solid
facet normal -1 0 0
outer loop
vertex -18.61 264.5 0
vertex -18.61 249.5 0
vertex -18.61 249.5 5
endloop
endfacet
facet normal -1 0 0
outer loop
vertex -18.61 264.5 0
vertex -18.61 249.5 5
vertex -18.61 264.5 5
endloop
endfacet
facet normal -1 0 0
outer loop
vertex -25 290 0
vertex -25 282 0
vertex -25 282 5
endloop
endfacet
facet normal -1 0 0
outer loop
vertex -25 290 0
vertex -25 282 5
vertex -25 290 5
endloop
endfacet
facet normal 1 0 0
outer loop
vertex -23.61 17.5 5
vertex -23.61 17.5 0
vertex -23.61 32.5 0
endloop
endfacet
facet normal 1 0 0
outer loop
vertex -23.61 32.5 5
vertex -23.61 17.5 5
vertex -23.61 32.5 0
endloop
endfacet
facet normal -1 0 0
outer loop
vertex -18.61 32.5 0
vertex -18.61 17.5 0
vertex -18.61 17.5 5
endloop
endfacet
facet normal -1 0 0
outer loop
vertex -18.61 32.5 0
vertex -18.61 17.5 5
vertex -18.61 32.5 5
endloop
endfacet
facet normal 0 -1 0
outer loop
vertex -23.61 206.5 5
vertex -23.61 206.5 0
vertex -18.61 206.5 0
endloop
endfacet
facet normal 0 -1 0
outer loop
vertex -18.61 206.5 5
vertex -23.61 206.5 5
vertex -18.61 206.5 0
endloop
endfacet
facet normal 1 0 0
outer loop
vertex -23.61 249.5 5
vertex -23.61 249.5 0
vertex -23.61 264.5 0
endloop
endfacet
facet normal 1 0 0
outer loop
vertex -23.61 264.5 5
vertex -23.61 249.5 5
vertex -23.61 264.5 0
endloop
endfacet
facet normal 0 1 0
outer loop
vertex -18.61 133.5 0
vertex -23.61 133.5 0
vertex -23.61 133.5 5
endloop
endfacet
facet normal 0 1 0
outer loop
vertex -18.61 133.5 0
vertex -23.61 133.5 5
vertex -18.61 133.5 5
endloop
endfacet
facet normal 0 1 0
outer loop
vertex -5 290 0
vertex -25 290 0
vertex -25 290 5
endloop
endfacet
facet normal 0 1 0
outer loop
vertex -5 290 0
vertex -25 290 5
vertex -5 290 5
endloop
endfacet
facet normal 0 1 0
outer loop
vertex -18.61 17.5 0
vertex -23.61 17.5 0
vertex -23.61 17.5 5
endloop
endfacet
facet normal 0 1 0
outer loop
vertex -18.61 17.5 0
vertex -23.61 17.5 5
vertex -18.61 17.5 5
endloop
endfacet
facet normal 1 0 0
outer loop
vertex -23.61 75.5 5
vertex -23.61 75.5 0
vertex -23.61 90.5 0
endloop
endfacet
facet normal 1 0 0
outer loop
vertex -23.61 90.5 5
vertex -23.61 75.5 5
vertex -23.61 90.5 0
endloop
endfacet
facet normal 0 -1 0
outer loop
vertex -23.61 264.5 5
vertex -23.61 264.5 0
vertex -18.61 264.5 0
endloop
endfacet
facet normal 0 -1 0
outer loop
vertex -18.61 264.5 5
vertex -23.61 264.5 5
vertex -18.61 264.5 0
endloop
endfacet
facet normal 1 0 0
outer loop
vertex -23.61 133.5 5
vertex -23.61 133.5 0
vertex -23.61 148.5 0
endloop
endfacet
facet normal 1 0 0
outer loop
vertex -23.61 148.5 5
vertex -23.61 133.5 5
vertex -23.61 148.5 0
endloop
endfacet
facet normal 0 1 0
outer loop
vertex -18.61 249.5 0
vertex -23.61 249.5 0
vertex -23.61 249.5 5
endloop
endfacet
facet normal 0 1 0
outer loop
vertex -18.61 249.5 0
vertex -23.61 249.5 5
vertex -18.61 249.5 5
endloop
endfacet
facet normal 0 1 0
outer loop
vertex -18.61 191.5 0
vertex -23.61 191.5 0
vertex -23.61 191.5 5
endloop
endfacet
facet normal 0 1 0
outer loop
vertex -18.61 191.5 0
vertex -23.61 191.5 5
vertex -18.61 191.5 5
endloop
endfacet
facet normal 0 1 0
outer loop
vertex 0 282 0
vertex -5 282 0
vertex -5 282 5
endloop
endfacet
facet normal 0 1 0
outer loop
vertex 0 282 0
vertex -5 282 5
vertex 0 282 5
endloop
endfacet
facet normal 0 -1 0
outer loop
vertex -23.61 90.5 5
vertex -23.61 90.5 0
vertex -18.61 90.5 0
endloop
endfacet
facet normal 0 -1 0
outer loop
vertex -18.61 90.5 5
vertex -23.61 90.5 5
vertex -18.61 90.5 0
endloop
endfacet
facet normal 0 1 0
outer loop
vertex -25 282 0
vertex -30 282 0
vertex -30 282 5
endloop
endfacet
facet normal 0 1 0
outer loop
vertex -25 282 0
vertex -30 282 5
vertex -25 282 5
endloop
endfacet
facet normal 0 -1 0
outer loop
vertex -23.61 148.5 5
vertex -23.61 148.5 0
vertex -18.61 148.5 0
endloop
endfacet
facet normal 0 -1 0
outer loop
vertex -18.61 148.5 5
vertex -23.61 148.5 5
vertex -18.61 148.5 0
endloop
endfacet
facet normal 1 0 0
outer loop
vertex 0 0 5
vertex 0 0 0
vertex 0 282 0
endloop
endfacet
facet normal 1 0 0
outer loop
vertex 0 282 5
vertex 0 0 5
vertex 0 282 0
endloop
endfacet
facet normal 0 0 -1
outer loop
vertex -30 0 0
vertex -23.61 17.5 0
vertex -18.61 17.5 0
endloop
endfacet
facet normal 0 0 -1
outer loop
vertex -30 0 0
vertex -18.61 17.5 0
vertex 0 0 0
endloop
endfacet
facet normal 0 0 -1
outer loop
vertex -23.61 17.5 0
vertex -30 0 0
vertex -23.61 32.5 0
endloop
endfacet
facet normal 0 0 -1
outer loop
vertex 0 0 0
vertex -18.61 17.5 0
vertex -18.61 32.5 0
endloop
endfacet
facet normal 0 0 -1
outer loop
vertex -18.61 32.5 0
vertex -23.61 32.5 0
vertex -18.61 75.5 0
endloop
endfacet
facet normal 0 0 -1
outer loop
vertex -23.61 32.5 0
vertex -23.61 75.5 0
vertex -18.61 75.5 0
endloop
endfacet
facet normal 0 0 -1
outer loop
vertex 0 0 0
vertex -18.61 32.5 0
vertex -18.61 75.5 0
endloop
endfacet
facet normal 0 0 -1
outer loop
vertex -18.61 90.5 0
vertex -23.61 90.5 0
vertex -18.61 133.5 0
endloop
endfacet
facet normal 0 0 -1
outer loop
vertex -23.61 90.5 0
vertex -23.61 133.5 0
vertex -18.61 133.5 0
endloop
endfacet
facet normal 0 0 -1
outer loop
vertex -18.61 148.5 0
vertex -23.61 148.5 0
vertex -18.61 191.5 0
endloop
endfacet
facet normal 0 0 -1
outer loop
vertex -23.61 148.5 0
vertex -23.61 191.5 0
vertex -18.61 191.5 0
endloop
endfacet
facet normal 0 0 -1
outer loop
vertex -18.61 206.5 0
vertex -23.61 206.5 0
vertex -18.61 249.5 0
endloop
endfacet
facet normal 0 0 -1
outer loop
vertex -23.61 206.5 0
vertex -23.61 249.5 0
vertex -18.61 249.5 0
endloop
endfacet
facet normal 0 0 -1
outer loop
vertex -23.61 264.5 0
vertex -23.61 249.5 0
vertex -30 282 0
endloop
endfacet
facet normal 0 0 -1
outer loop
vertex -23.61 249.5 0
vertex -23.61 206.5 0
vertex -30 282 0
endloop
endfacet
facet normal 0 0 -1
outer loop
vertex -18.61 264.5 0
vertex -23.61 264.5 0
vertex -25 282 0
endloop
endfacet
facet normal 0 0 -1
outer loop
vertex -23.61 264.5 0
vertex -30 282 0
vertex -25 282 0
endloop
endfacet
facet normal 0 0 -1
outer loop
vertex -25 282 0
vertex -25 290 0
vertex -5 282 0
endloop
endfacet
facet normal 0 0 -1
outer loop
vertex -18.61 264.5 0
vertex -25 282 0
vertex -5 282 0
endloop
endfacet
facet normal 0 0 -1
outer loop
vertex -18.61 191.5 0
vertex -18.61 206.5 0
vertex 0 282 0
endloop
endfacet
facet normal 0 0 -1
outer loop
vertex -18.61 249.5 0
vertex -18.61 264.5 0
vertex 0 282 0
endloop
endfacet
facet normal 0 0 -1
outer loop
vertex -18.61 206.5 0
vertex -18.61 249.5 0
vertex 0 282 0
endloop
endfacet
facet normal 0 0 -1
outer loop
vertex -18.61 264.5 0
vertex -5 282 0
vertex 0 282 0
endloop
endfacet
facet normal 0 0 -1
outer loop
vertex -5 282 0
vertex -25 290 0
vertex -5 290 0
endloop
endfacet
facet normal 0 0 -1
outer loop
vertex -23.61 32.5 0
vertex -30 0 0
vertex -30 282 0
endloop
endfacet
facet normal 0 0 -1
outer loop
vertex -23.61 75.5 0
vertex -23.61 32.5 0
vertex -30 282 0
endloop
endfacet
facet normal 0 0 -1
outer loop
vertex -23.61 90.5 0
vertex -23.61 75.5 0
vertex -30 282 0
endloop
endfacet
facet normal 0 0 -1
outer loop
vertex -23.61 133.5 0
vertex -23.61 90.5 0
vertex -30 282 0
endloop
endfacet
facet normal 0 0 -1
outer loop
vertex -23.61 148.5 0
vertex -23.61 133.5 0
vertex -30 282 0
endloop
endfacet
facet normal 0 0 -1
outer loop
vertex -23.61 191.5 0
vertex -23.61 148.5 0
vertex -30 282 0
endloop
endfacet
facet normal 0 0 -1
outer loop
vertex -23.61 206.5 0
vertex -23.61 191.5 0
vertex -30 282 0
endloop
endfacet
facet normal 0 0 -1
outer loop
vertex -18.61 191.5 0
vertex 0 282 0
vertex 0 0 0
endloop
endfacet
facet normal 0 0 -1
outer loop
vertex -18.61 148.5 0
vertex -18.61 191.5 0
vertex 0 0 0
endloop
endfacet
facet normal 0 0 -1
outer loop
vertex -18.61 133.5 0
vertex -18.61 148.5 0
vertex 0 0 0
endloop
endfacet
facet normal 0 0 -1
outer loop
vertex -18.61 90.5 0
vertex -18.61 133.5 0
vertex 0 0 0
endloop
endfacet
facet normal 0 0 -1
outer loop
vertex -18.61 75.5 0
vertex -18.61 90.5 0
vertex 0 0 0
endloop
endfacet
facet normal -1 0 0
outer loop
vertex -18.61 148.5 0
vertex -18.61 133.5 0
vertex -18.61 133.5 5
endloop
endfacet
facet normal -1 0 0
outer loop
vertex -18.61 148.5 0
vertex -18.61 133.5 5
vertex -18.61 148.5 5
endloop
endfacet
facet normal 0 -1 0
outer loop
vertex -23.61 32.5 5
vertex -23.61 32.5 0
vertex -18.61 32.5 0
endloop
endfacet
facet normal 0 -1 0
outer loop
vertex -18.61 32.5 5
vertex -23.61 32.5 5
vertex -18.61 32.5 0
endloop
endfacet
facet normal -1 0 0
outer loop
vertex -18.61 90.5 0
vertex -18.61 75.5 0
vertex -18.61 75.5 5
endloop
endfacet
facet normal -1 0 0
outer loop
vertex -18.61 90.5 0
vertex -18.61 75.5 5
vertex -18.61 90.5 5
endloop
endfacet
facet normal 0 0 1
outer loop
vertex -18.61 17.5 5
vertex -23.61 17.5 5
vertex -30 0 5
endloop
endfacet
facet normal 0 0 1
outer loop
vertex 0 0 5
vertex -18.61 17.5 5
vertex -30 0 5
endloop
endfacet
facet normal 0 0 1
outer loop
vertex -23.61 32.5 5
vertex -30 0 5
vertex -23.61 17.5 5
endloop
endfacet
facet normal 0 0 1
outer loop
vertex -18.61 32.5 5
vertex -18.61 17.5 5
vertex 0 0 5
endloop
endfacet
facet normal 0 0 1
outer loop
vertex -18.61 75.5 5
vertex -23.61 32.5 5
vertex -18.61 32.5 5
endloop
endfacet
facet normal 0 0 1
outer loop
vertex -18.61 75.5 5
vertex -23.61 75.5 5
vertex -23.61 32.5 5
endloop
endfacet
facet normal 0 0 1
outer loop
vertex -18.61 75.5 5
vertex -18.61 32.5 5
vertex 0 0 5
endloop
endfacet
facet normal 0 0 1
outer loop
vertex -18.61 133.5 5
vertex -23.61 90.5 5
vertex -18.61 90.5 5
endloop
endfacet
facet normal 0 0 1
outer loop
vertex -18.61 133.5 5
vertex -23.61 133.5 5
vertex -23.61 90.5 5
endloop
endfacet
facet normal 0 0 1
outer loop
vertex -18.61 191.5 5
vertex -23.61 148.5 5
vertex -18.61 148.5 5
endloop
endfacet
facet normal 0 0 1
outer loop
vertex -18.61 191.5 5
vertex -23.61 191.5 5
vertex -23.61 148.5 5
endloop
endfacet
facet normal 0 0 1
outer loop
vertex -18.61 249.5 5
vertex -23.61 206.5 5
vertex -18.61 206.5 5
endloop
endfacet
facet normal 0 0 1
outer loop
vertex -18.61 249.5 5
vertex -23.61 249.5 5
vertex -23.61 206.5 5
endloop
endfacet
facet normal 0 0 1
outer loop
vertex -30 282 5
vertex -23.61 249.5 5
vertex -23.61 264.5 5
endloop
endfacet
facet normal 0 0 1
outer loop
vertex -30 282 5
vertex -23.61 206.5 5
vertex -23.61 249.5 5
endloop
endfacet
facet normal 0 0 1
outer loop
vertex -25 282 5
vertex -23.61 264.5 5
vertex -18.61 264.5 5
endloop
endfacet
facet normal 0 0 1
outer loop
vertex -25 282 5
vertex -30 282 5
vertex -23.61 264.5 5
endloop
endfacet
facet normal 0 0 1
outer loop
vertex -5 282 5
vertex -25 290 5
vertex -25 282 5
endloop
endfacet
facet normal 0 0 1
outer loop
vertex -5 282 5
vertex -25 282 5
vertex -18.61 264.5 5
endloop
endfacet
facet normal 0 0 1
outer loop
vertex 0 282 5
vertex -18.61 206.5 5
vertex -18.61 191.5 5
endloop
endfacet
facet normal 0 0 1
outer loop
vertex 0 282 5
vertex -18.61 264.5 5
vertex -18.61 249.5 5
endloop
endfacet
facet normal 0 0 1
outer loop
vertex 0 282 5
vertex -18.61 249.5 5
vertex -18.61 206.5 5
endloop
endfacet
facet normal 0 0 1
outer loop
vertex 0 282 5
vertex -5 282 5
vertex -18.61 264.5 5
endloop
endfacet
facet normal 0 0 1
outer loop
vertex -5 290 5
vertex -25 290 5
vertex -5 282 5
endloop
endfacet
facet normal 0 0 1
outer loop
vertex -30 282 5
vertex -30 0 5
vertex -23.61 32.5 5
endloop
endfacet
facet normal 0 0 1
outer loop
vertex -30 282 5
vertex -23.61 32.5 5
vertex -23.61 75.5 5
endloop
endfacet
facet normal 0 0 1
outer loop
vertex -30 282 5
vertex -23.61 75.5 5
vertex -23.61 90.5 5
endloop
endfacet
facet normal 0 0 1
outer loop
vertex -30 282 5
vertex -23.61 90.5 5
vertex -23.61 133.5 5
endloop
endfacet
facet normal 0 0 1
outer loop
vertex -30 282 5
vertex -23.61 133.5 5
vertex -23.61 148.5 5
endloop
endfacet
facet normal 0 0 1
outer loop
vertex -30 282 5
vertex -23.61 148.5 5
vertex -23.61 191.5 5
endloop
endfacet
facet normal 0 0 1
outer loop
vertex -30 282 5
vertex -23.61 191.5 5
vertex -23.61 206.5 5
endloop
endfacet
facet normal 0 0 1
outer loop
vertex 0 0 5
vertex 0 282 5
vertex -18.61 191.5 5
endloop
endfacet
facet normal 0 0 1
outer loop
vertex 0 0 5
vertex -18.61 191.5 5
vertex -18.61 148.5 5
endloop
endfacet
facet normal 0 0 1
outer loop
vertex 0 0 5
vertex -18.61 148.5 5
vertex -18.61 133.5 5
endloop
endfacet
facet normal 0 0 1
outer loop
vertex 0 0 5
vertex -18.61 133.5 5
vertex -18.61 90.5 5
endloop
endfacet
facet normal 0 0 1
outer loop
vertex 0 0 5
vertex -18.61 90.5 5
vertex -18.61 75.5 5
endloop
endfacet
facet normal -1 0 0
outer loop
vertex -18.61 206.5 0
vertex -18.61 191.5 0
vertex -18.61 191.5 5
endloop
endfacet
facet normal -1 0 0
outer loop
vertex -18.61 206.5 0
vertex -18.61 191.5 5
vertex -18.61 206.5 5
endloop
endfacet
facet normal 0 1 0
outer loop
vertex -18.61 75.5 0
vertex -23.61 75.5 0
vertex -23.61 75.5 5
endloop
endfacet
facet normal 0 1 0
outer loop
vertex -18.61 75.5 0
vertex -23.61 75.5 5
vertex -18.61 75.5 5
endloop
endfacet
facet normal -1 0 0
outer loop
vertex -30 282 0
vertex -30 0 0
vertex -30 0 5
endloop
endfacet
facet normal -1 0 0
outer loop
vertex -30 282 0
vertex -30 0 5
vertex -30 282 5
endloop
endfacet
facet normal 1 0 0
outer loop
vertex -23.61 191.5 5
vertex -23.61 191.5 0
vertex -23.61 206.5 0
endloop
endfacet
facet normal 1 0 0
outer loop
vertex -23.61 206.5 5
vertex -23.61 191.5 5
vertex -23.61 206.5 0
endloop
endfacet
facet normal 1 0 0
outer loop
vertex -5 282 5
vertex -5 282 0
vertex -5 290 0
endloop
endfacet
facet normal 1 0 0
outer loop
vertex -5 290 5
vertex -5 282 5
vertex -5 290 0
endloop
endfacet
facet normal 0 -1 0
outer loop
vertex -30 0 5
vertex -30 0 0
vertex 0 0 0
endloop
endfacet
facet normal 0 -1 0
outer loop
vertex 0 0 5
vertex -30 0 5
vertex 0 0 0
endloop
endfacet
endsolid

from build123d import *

# Parameters (mm, degrees)
ESQUISSE1_W             = 30
ESQUISSE1_H             = 290
BOSS_EXTRU_1_DEPTH      = 5
ESQUISSE1_6_W           = 5
ESQUISSE1_6_H           = 8
ENL_V_MAT_EXTRU_1_DEPTH = 5
ESQUISSE1_7_W           = 5
ESQUISSE1_7_H           = 15
ESQUISSE1_7_H_2         = 8
ENL_V_MAT_EXTRU_2_DEPTH = 5


with BuildPart() as part:
    # Esquisse1 → Boss.-Extru.1 (new body)
    with BuildSketch(Plane.XY):
        with Locations((-15, 145)):
            Rectangle(ESQUISSE1_W, ESQUISSE1_H)
    extrude(amount=BOSS_EXTRU_1_DEPTH)

    # Esquisse1<6> → Enlèv. mat.-Extru.1 (cut)
    with BuildSketch(Plane.XY):
        with Locations((-2.5, 286)):
            Rectangle(ESQUISSE1_6_W, ESQUISSE1_6_H)
    extrude(amount=ENL_V_MAT_EXTRU_1_DEPTH, mode=Mode.SUBTRACT)

    # Esquisse1<7> → Enlèv. mat.-Extru.2 (cut)
    with BuildSketch(Plane.XY):
        with Locations((-21.11, 25)):
            Rectangle(ESQUISSE1_7_W, ESQUISSE1_7_H)
        with Locations((-21.11, 83)):
            Rectangle(ESQUISSE1_7_W, ESQUISSE1_7_H)
        with Locations((-21.11, 141)):
            Rectangle(ESQUISSE1_7_W, ESQUISSE1_7_H)
        with Locations((-21.11, 199)):
            Rectangle(ESQUISSE1_7_W, ESQUISSE1_7_H)
        with Locations((-21.11, 257)):
            Rectangle(ESQUISSE1_7_W, ESQUISSE1_7_H)
        with Locations((-27.5, 286)):
            Rectangle(ESQUISSE1_7_W, ESQUISSE1_7_H_2)
    extrude(amount=ENL_V_MAT_EXTRU_2_DEPTH, mode=Mode.SUBTRACT)


solid = part.part
